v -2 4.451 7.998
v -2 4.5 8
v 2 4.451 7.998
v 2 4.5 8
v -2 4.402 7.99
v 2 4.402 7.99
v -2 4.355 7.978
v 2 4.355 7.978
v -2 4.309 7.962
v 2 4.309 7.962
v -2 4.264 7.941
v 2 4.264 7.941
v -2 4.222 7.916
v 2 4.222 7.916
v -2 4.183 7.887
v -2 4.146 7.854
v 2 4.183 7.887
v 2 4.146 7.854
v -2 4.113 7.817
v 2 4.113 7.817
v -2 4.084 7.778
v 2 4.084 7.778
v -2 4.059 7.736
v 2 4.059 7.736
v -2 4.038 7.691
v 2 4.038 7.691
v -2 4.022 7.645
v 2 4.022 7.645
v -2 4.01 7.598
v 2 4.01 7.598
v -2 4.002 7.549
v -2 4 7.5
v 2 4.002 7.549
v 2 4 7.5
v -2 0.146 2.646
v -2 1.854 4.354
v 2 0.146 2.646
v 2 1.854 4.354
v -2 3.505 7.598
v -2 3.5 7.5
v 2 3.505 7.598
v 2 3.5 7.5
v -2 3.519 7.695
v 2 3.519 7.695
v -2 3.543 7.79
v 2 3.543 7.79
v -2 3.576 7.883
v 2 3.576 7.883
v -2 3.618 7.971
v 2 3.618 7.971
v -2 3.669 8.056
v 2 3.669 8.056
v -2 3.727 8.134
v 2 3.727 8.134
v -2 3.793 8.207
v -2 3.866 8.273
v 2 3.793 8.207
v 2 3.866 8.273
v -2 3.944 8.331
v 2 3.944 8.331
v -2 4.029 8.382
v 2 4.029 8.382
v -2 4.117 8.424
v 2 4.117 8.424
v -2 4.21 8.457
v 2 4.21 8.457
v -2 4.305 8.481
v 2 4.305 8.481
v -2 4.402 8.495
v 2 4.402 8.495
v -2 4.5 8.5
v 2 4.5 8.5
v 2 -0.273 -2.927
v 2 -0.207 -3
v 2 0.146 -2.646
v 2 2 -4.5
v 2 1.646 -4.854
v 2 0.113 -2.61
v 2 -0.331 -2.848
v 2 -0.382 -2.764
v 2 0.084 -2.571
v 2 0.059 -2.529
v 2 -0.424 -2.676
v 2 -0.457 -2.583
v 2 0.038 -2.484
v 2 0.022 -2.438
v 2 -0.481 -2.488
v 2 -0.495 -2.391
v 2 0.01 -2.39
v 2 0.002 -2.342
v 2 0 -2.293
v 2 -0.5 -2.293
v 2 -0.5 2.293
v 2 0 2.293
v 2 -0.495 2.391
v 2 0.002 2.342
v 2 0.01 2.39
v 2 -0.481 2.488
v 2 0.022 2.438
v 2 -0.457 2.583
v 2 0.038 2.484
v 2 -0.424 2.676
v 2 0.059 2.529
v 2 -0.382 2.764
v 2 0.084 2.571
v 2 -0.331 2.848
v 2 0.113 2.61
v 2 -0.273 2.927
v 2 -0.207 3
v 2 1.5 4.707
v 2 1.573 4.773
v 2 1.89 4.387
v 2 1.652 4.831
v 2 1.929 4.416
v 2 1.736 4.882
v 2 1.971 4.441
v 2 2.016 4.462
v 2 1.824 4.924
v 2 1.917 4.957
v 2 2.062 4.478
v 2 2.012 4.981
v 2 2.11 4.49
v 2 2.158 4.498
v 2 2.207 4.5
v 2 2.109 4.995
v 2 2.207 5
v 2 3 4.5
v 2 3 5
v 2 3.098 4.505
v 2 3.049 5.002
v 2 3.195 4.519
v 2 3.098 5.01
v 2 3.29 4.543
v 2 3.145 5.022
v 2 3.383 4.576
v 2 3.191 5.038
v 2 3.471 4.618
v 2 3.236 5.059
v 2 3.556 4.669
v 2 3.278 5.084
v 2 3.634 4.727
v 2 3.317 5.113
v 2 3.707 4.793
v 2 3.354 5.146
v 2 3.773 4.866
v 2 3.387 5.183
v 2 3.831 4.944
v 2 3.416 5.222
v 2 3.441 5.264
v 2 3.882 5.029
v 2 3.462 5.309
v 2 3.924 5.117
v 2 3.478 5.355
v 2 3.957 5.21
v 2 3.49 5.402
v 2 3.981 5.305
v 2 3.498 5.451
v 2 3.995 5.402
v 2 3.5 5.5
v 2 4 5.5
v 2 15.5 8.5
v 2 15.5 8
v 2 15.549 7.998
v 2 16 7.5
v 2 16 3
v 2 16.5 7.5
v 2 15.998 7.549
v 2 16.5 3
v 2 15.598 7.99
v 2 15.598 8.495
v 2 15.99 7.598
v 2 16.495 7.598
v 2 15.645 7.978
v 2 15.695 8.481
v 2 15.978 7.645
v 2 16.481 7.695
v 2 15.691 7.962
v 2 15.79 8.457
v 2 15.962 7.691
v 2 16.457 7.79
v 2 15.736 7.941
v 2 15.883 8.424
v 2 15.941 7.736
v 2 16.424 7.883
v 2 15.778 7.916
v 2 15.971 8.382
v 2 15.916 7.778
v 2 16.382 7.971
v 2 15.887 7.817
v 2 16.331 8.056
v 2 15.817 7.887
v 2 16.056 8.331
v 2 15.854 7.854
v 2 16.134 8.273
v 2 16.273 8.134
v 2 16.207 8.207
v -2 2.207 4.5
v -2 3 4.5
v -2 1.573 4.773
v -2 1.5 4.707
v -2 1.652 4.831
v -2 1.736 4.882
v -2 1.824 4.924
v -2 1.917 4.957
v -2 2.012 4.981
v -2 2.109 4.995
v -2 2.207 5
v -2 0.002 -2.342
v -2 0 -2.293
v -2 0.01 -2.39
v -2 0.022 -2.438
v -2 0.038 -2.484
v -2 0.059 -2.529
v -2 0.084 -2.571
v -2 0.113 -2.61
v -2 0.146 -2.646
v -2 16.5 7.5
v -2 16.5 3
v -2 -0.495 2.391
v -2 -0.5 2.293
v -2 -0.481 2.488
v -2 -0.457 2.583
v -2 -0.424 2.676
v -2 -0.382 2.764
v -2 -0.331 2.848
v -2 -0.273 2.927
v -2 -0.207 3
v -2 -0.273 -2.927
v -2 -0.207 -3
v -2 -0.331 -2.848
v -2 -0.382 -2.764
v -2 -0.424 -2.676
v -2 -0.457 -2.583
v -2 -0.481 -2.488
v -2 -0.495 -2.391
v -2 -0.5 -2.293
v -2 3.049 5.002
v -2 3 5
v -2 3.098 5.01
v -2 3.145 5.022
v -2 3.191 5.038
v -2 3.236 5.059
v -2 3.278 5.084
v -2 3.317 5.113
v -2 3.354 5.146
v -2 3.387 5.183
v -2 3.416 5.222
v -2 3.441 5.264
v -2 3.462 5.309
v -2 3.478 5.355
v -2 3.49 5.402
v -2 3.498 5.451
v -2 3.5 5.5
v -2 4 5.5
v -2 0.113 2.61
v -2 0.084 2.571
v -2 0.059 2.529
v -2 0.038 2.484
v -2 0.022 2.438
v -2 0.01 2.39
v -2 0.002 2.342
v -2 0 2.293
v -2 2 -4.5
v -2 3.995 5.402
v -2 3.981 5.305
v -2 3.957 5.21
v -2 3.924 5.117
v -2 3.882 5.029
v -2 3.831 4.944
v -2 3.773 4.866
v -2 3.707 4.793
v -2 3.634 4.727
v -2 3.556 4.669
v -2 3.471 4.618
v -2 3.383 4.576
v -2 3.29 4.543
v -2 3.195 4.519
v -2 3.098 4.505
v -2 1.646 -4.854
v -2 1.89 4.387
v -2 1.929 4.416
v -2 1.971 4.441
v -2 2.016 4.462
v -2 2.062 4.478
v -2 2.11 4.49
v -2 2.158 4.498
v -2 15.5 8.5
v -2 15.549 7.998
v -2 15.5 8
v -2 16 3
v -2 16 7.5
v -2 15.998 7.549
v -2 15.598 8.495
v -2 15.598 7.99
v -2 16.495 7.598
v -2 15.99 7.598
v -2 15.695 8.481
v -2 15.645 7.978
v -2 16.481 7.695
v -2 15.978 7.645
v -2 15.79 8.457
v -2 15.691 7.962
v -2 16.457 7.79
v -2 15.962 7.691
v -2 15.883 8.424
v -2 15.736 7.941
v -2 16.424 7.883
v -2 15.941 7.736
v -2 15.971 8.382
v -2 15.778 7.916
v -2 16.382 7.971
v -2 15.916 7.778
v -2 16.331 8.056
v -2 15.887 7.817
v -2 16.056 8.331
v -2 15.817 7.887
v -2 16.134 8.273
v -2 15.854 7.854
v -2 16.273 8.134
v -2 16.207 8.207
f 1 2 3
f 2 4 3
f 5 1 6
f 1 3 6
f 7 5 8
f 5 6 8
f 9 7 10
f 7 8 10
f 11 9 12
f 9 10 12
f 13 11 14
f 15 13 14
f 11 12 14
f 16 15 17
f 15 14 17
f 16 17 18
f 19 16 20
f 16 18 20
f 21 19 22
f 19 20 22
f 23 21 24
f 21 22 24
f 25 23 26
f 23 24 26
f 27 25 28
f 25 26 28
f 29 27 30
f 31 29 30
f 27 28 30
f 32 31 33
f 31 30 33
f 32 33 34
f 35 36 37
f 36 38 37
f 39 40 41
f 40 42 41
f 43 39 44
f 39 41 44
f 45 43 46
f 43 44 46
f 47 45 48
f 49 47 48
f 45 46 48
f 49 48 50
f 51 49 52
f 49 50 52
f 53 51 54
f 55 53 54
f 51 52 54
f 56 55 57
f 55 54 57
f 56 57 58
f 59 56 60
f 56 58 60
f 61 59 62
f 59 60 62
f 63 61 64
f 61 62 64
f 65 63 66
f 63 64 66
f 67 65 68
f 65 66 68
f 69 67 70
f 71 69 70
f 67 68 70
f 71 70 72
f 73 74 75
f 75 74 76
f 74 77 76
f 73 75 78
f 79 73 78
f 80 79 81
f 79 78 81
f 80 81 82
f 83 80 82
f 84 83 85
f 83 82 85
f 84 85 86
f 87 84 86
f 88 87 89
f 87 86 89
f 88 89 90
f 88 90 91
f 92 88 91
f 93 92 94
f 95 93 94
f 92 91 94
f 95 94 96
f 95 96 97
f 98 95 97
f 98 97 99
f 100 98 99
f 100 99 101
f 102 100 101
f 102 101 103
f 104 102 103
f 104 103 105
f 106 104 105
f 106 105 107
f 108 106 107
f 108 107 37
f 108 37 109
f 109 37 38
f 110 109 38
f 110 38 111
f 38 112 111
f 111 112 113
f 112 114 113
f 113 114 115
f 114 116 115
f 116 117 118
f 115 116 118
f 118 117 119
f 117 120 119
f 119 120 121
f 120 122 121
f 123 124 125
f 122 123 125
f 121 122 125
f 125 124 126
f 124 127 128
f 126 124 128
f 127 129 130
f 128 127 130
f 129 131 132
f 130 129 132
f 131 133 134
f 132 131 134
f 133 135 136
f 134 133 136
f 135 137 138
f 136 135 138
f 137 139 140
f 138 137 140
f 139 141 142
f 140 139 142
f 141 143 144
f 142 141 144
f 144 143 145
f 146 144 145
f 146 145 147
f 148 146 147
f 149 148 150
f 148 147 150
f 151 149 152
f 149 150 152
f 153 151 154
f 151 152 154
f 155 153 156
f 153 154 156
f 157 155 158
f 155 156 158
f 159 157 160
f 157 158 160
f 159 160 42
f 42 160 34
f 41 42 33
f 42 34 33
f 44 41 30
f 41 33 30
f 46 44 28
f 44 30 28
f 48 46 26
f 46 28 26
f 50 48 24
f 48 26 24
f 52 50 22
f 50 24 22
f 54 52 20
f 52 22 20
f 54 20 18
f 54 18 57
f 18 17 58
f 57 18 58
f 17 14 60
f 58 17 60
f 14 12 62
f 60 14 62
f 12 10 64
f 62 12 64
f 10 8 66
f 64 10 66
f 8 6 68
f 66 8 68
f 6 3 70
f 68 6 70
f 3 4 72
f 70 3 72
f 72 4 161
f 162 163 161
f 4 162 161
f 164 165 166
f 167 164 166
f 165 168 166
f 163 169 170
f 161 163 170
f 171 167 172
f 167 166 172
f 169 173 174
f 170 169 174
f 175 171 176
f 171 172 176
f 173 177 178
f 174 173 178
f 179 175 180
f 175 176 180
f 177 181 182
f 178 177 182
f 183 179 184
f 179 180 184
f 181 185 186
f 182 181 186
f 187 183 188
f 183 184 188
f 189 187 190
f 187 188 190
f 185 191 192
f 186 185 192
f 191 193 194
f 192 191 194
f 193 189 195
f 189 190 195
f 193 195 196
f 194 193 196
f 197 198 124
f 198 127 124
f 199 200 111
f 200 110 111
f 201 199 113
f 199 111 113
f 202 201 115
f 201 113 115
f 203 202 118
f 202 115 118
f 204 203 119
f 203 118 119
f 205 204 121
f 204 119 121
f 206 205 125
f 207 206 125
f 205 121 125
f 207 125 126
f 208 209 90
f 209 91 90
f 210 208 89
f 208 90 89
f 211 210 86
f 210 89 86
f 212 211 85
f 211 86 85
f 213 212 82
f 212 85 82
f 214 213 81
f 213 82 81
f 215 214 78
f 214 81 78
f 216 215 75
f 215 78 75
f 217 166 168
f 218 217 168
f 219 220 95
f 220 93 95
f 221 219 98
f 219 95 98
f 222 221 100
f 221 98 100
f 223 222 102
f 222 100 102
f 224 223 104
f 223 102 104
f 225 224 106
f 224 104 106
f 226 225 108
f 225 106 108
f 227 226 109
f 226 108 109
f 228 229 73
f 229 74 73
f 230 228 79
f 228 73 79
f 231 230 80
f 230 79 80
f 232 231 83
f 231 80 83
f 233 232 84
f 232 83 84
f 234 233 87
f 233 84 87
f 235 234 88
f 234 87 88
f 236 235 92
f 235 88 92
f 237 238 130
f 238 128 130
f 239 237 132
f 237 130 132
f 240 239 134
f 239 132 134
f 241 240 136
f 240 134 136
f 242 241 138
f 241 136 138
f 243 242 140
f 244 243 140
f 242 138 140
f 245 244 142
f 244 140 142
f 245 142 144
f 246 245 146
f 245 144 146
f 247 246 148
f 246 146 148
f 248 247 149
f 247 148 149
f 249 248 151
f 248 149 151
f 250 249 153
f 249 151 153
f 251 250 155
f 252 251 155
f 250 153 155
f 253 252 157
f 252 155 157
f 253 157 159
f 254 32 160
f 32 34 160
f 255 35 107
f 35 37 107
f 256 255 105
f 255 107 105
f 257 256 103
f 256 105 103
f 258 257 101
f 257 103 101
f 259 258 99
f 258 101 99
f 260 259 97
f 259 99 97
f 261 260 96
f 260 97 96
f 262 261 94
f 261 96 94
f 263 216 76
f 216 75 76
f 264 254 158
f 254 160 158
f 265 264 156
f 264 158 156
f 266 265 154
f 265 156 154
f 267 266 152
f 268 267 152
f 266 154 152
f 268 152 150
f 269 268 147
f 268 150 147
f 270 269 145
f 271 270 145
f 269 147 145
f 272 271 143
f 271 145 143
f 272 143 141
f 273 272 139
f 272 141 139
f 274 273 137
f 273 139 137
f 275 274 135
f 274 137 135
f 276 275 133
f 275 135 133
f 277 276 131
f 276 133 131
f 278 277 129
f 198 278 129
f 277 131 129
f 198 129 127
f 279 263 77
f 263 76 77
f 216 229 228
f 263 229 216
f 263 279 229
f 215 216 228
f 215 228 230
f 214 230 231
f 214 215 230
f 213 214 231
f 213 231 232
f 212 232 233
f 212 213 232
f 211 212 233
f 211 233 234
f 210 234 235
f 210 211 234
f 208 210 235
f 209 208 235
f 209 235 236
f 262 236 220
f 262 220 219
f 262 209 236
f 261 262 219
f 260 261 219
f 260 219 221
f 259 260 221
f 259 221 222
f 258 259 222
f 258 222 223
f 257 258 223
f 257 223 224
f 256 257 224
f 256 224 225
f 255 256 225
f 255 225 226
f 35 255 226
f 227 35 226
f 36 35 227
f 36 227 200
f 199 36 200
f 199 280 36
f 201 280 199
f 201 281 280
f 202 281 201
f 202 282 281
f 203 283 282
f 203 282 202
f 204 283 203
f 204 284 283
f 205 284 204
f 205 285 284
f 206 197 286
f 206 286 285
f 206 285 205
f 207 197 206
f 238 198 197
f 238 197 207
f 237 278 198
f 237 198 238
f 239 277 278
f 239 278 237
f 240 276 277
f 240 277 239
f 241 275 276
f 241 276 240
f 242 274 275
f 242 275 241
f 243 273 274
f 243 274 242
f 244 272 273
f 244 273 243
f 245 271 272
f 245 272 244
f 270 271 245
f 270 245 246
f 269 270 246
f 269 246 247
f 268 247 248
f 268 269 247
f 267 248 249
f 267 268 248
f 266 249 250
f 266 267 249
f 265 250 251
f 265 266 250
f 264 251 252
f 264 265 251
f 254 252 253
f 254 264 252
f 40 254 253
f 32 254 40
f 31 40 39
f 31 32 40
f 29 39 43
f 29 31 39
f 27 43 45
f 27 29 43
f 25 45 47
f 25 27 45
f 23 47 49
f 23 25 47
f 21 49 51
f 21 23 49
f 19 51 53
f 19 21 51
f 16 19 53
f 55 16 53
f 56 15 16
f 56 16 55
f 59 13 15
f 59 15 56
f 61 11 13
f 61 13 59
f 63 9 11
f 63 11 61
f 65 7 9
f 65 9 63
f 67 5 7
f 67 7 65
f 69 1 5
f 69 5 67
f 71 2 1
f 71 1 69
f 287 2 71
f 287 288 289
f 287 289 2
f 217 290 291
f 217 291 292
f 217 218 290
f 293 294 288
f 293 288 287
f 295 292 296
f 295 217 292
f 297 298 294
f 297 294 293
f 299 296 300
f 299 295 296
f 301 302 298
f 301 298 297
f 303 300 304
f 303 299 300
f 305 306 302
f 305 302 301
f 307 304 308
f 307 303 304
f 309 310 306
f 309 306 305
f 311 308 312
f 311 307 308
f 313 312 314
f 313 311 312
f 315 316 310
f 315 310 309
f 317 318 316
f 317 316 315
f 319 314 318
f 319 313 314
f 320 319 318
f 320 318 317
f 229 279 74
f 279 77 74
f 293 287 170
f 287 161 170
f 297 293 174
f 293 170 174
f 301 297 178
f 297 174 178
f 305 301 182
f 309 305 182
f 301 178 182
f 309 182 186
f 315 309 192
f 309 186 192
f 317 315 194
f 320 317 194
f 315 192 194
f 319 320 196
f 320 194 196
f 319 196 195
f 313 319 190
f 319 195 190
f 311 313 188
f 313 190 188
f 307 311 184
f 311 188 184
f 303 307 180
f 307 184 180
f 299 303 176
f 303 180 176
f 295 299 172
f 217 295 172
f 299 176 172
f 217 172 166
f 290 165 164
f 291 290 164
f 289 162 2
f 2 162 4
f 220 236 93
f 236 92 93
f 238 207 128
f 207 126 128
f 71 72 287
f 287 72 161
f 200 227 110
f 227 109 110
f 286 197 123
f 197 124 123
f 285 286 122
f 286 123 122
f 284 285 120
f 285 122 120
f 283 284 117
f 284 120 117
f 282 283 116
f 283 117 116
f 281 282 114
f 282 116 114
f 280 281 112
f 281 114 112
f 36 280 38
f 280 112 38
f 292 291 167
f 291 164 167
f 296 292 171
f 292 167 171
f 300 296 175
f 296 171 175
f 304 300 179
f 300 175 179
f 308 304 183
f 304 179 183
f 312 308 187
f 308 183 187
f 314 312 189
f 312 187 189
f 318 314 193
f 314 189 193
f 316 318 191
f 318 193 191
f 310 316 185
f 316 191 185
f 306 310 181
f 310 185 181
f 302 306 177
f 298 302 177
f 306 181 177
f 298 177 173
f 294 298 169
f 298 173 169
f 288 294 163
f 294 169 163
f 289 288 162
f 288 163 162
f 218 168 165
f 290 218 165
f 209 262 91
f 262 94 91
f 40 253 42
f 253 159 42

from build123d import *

# Parameters (mm, degrees)
BASE_FLANGE1_DEPTH = 2


# Sheet-metal steps are written as plain solids
with BuildPart() as part:
    # Sketch1 → Base-Flange1 (new, symmetric)
    with BuildSketch(Plane(origin=(0, 0, 0), x_dir=(0, 0, -1), z_dir=(1, 0, 0))):
        with BuildLine():
            Line((-3, 16), (-7.5, 16))
            ThreePointArc((-7.5, 16), (-7.853553391, 15.853553391), (-8, 15.5))
            Line((-8, 15.5), (-8, 4.5))
            ThreePointArc((-8, 4.5), (-7.853553391, 4.146446609), (-7.5, 4))
            Line((-7.5, 4), (-5.5, 4))
            ThreePointArc((-5.5, 4), (-4.792893219, 3.707106781), (-4.5, 3))
            Line((-4.5, 3), (-4.5, 2.207106781))
            ThreePointArc((-4.5, 2.207106781), (-4.461939766, 2.015765065), (-4.353553391, 1.853553391))
            Line((-4.353553391, 1.853553391), (-2.646446609, 0.146446609))
            ThreePointArc((-2.646446609, 0.146446609), (-2.484234935, 0.038060234), (-2.292893219, 0))
            Line((-2.292893219, 0), (2.292893219, 0))
            ThreePointArc((2.292893219, 0), (2.484234935, 0.038060234), (2.646446609, 0.146446609))
            Line((2.646446609, 0.146446609), (4.5, 2))
            Line((4.5, 2), (4.853553391, 1.646446609))
            Line((4.853553391, 1.646446609), (3, -0.207106781))
            ThreePointArc((3, -0.207106781), (2.675576651, -0.423879533), (2.292893219, -0.5))
            Line((2.292893219, -0.5), (-2.292893219, -0.5))
            ThreePointArc((-2.292893219, -0.5), (-2.675576651, -0.423879533), (-3, -0.207106781))
            Line((-3, -0.207106781), (-4.707106781, 1.5))
            ThreePointArc((-4.707106781, 1.5), (-4.923879533, 1.824423349), (-5, 2.207106781))
            Line((-5, 2.207106781), (-5, 3))
            ThreePointArc((-5, 3), (-5.146446609, 3.353553391), (-5.5, 3.5))
            Line((-5.5, 3.5), (-7.5, 3.5))
            ThreePointArc((-7.5, 3.5), (-8.207106781, 3.792893219), (-8.5, 4.5))
            Line((-8.5, 4.5), (-8.5, 15.5))
            ThreePointArc((-8.5, 15.5), (-8.207106781, 16.207106781), (-7.5, 16.5))
            Line((-7.5, 16.5), (-3, 16.5))
            Line((-3, 16.5), (-3, 16))
        make_face()
    extrude(amount=BASE_FLANGE1_DEPTH, both=True)


solid = part.part
